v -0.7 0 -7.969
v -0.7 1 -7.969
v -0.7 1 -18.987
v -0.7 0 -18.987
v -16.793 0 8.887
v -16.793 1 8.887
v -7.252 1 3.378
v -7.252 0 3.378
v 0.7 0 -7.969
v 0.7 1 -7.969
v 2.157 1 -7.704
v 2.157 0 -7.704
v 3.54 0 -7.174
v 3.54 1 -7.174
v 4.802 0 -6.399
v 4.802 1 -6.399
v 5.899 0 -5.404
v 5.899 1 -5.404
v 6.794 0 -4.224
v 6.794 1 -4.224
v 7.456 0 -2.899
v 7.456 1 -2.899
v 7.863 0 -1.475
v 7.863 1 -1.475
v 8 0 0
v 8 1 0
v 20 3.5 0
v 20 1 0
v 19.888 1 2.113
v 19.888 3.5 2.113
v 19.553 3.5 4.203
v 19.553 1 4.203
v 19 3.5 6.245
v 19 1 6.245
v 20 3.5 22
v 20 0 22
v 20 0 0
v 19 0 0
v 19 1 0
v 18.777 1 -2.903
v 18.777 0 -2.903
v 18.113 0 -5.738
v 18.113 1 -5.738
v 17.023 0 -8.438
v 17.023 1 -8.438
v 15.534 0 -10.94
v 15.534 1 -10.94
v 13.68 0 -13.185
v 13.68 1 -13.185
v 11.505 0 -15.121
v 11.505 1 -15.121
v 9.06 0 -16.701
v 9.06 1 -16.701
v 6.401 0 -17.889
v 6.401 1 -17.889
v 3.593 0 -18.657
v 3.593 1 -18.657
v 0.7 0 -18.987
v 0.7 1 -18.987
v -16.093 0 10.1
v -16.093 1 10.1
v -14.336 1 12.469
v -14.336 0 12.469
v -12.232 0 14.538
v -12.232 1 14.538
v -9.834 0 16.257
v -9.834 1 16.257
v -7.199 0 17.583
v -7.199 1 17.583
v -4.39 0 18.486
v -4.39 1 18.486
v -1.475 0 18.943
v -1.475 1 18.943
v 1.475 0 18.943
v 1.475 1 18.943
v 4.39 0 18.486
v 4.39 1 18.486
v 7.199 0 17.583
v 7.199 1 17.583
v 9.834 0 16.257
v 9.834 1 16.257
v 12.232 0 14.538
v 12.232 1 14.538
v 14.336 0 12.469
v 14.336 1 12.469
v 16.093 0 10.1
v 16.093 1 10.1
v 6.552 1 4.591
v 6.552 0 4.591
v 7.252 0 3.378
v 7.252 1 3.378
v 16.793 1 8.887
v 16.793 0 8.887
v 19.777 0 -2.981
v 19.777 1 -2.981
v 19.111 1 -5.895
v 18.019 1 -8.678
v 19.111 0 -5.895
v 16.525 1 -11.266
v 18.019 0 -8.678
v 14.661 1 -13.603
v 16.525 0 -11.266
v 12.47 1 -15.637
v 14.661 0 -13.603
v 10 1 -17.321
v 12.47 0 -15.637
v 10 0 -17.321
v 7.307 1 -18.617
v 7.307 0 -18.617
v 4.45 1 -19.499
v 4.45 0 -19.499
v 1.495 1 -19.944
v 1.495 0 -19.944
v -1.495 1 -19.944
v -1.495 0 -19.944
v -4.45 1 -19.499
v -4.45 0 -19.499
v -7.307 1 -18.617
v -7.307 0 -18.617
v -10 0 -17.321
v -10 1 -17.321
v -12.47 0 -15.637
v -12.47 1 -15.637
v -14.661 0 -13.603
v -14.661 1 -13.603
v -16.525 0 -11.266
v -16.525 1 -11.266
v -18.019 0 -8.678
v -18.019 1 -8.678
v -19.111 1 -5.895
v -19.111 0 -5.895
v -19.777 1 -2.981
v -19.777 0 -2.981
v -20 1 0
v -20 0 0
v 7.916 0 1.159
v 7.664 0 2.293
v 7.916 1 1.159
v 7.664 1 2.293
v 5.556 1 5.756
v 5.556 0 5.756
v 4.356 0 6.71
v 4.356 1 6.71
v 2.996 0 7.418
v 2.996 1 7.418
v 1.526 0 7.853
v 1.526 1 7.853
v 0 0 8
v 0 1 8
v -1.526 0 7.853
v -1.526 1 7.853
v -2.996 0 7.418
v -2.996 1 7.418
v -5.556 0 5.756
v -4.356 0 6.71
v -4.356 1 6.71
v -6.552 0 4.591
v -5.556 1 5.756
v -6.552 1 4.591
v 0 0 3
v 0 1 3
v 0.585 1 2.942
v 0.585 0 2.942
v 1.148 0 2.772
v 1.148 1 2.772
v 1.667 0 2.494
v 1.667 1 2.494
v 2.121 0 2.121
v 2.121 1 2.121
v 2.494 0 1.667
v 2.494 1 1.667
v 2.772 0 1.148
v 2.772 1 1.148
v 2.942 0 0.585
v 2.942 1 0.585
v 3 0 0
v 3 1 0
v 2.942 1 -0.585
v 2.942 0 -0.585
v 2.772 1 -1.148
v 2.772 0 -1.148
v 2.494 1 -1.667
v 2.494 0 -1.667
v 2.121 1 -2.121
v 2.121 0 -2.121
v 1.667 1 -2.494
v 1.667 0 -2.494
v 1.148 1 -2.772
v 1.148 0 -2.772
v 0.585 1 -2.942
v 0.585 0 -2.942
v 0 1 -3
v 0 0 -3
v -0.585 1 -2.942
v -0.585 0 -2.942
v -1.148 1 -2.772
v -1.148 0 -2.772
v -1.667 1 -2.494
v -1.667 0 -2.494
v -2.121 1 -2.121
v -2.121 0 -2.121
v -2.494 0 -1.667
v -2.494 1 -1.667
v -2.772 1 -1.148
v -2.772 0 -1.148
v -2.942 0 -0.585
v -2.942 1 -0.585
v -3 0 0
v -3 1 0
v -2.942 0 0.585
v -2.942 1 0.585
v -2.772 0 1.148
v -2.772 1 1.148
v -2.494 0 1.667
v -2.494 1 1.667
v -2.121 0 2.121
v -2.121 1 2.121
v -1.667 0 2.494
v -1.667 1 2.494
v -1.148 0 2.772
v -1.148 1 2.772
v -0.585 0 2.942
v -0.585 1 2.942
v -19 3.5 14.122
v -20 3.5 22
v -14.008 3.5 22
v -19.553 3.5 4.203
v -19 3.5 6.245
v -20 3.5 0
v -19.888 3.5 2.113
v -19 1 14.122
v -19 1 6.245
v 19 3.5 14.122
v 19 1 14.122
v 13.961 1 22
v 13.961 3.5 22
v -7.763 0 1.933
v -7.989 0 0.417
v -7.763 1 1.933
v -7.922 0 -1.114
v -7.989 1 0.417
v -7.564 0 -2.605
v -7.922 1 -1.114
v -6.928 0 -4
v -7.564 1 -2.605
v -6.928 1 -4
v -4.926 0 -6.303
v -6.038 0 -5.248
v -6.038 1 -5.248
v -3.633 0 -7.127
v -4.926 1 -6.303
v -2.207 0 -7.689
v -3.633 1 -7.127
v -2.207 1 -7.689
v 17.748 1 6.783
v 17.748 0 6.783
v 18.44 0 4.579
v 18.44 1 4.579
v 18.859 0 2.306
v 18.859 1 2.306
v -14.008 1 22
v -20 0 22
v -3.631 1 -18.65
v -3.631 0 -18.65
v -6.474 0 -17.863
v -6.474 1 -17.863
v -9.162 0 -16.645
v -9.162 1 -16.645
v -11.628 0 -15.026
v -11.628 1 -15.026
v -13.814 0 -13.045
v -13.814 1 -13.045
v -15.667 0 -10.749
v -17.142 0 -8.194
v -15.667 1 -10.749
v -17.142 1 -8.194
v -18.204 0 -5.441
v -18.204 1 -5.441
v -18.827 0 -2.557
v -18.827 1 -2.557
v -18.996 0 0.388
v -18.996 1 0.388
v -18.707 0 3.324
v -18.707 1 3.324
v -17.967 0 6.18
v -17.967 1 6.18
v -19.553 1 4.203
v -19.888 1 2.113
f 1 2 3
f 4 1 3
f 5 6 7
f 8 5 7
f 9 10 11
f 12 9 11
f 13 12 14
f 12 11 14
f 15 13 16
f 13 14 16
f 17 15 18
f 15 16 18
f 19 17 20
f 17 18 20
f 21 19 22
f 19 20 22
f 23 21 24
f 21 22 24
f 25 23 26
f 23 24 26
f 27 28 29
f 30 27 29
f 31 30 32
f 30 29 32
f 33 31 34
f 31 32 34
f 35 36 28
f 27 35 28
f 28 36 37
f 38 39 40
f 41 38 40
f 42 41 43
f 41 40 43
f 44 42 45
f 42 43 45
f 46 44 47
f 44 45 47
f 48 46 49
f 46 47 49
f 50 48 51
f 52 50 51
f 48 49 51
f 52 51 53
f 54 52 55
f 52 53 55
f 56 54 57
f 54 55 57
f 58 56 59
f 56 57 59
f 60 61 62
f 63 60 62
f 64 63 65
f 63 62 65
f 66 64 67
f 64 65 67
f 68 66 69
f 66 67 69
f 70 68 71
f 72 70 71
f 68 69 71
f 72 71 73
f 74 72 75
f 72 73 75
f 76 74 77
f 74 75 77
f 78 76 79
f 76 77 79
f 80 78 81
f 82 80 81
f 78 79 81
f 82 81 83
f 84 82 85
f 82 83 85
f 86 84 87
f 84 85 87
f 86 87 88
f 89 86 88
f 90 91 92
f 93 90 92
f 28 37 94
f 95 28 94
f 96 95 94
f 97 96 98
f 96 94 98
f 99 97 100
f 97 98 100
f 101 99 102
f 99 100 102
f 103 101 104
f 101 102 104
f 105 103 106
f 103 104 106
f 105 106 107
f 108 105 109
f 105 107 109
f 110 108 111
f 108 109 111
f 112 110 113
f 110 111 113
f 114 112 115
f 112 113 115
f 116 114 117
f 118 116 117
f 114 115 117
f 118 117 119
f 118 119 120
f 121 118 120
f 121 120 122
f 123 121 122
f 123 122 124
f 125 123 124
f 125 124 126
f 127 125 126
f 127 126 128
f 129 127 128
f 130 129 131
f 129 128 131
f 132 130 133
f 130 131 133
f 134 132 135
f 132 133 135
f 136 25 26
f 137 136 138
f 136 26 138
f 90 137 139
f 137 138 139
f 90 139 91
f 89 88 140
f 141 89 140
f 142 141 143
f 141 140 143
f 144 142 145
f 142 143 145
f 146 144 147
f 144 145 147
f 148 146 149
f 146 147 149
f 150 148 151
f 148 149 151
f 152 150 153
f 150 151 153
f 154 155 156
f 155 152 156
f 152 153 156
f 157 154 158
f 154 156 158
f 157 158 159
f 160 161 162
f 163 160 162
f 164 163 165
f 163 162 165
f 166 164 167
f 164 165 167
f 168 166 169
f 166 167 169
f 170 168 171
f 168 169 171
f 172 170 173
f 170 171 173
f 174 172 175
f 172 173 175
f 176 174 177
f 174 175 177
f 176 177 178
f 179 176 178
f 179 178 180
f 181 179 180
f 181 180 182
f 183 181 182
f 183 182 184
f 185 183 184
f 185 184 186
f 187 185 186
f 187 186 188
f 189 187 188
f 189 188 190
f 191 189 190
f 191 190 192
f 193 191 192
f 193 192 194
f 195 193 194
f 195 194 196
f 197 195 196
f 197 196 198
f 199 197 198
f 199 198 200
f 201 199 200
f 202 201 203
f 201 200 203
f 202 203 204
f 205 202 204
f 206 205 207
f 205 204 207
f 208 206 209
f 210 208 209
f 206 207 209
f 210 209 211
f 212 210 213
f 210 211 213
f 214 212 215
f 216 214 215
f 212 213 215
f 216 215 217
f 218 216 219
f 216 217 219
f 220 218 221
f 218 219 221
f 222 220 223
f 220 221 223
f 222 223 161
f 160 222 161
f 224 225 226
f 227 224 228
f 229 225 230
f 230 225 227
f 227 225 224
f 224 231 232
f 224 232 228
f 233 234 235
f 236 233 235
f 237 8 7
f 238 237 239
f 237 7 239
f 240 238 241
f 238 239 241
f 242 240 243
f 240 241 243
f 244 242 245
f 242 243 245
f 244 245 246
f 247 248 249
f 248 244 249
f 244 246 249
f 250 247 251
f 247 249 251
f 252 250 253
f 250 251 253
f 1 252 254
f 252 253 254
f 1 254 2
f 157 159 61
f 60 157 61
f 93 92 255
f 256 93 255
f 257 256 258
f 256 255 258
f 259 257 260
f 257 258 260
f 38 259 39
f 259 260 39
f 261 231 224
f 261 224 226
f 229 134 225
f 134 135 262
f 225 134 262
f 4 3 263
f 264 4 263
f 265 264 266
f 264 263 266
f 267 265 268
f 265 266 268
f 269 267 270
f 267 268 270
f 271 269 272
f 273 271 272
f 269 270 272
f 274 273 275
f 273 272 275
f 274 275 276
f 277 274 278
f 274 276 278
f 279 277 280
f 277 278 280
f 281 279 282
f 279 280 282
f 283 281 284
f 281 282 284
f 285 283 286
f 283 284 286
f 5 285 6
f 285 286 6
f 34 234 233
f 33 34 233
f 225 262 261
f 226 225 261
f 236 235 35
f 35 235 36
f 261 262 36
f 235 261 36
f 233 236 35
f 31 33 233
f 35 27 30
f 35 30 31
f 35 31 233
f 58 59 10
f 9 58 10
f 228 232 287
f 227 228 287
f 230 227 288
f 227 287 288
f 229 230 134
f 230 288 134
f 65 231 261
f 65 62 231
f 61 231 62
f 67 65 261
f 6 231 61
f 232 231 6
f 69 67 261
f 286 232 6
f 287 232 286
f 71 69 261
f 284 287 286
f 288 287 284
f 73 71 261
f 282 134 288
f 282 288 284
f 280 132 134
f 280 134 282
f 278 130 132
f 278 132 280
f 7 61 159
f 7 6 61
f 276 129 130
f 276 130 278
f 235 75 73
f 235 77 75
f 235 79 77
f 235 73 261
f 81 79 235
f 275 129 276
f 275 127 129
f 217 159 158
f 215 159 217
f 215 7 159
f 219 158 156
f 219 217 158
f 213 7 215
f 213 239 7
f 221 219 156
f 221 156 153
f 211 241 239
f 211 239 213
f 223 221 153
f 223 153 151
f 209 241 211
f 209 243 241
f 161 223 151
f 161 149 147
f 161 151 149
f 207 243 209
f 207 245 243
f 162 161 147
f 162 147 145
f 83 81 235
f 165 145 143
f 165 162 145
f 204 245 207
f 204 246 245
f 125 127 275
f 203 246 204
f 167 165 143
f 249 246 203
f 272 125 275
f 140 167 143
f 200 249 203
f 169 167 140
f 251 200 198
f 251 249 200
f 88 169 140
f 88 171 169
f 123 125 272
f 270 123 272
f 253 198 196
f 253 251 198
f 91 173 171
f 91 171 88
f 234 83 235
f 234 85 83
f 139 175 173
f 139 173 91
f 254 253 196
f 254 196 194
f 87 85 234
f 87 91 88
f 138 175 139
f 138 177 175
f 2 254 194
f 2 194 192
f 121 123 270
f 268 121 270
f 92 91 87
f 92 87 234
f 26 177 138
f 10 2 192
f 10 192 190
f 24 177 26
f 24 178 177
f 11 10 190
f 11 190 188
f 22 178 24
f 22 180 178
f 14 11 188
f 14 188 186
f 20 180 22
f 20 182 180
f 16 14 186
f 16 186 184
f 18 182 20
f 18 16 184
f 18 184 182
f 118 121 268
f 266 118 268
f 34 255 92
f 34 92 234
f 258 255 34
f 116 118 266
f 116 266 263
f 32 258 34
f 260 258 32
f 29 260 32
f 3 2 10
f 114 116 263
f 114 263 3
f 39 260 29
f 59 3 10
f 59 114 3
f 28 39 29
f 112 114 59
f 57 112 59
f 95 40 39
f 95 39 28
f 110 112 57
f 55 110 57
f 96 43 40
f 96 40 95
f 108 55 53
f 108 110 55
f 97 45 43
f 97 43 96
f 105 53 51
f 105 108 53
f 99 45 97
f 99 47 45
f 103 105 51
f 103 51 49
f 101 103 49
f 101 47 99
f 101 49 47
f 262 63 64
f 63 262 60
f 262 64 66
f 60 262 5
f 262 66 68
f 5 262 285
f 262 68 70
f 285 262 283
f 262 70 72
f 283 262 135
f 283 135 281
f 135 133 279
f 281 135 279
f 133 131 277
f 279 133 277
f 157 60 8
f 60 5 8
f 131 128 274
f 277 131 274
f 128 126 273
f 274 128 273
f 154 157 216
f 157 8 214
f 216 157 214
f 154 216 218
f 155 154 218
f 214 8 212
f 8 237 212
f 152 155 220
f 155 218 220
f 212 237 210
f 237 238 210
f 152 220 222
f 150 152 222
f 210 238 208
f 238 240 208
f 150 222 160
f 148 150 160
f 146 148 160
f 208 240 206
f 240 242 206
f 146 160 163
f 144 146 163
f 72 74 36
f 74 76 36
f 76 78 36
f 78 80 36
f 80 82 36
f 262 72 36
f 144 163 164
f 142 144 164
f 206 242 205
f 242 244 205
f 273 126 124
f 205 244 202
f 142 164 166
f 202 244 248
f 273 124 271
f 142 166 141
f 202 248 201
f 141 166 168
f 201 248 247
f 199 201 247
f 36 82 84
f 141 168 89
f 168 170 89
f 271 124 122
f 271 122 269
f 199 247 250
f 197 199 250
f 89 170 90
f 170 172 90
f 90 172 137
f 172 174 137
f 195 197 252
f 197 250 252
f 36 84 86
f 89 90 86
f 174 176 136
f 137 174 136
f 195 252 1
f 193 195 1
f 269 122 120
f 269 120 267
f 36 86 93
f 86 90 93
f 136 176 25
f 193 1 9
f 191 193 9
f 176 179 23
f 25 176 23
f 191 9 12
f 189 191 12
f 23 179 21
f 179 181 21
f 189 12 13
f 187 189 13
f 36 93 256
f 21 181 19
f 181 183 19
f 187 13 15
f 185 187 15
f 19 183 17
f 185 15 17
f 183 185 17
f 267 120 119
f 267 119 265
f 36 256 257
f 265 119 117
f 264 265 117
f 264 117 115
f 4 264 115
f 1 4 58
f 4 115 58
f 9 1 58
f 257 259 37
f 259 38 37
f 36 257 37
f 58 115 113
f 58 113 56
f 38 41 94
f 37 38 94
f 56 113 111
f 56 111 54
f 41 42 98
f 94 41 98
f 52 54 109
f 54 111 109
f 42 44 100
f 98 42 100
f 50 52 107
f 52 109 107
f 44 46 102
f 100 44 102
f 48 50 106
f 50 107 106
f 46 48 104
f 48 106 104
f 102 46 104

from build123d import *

# Parameters (mm, degrees)
EXTRUDE_4_DEPTH     = 1
EXTRUDE_5_DEPTH     = 2.5
CUT_EXTRUDE_2_DEPTH = 30.837057496
SKETCH_6_R          = 3
CUT_EXTRUDE_3_DEPTH = 30.837057496
SKETCH_7_W          = 38
SKETCH_7_H          = 2.5
CUT_EXTRUDE_4_DEPTH = 47.650294747
EXTRUDE_6_DEPTH     = 2.5


with BuildPart() as part:
    # 草图1 → 凸台-拉伸4 (new body)
    with BuildSketch(Plane(origin=(0, 0, 0), x_dir=(1, 0, 0), z_dir=(0, 1, 0))):
        with BuildLine():
            ThreePointArc((20, 0), (0, 20), (-20, 0))
            Line((-20, 0), (20, 0))
        make_face()
        with BuildLine():
            Line((20, 0), (-20, 0))
            ThreePointArc((-20, 0), (0, -20), (20, 0))
        make_face()
        with BuildLine():
            ThreePointArc((20, 0), (0, -20), (-20, 0))
            Line((-20, 0), (-20, -22))
            Line((-20, -22), (20, -22))
            Line((20, -22), (20, 0))
        make_face()
    extrude(amount=EXTRUDE_4_DEPTH)

    # 草图4 → 凸台-拉伸5 (add)
    with BuildSketch(Plane(origin=(0, 1, 0), x_dir=(1, 0, 0), z_dir=(0, 1, 0))):
        with BuildLine():
            ThreePointArc((20, 0), (0, -20), (-20, 0))
            Line((-20, 0), (-20, -22))
            Line((-20, -22), (20, -22))
            Line((20, -22), (20, 0))
        make_face()
    extrude(amount=EXTRUDE_5_DEPTH)

    # 草图5 → 切除-拉伸2 (cut, through all)
    with BuildSketch(Plane(origin=(0, 1, 0), x_dir=(1, 0, 0), z_dir=(0, 1, 0))):
        with BuildLine():
            ThreePointArc((-7.251630242, -3.378440296), (-6.92820323, 4), (-0.7, 7.969316156))
            Line((-0.7, 7.969316156), (-0.7, 18.987100885))
            ThreePointArc((-0.7, 18.987100885), (-16.454482672, 9.5), (-16.79331171, -8.88733266))
            Line((-16.79331171, -8.88733266), (-7.251630242, -3.378440296))
        make_face()
        with BuildLine():
            ThreePointArc((8, 0), (7.810667127, -1.730167342), (7.251630242, -3.378440296))
            Line((7.251630242, -3.378440296), (16.79331171, -8.88733266))
            ThreePointArc((16.79331171, -8.88733266), (18.440077582, -4.578595718), (19, 0))
            ThreePointArc((19, 0), (13.680277775, 13.185218997), (0.7, 18.987100885))
            Line((0.7, 18.987100885), (0.7, 7.969316156))
            ThreePointArc((0.7, 7.969316156), (5.899152482, 5.403702434), (8, 0))
        make_face()
        with BuildLine():
            Line((16.09331171, -10.099768225), (6.551630242, -4.590875861))
            ThreePointArc((6.551630242, -4.590875861), (0, -8), (-6.551630242, -4.590875861))
            Line((-6.551630242, -4.590875861), (-16.09331171, -10.099768225))
            ThreePointArc((-16.09331171, -10.099768225), (0, -19), (16.09331171, -10.099768225))
        make_face()
    extrude(amount=-CUT_EXTRUDE_2_DEPTH, mode=Mode.SUBTRACT)

    # 草图6 → 切除-拉伸3 (cut, through all)
    with BuildSketch(Plane(origin=(0, 1, 0), x_dir=(1, 0, 0), z_dir=(0, 1, 0))):
        with Locations(Location((0, 0, 0), (0, 0, 270))):
            Circle(SKETCH_6_R)
    extrude(amount=-CUT_EXTRUDE_3_DEPTH, mode=Mode.SUBTRACT)

    # 草图7 → 切除-拉伸4 (cut, through all)
    with BuildSketch(Plane.XY.offset(22)):
        with Locations((0, 2.25)):
            Rectangle(SKETCH_7_W, SKETCH_7_H)
    extrude(amount=-CUT_EXTRUDE_4_DEPTH, mode=Mode.SUBTRACT)

    # 草图8 → 凸台-拉伸6 (add)
    with BuildSketch(Plane(origin=(0, 1, 0), x_dir=(1, 0, 0), z_dir=(0, 1, 0))):
        Polygon((19, -14.122498999), (13.960934911, -22), (19, -22), align=None)
        Polygon((-19, -14.122498999), (-14.007707412, -22), (-19, -22), align=None)
    extrude(amount=EXTRUDE_6_DEPTH)


solid = part.part
